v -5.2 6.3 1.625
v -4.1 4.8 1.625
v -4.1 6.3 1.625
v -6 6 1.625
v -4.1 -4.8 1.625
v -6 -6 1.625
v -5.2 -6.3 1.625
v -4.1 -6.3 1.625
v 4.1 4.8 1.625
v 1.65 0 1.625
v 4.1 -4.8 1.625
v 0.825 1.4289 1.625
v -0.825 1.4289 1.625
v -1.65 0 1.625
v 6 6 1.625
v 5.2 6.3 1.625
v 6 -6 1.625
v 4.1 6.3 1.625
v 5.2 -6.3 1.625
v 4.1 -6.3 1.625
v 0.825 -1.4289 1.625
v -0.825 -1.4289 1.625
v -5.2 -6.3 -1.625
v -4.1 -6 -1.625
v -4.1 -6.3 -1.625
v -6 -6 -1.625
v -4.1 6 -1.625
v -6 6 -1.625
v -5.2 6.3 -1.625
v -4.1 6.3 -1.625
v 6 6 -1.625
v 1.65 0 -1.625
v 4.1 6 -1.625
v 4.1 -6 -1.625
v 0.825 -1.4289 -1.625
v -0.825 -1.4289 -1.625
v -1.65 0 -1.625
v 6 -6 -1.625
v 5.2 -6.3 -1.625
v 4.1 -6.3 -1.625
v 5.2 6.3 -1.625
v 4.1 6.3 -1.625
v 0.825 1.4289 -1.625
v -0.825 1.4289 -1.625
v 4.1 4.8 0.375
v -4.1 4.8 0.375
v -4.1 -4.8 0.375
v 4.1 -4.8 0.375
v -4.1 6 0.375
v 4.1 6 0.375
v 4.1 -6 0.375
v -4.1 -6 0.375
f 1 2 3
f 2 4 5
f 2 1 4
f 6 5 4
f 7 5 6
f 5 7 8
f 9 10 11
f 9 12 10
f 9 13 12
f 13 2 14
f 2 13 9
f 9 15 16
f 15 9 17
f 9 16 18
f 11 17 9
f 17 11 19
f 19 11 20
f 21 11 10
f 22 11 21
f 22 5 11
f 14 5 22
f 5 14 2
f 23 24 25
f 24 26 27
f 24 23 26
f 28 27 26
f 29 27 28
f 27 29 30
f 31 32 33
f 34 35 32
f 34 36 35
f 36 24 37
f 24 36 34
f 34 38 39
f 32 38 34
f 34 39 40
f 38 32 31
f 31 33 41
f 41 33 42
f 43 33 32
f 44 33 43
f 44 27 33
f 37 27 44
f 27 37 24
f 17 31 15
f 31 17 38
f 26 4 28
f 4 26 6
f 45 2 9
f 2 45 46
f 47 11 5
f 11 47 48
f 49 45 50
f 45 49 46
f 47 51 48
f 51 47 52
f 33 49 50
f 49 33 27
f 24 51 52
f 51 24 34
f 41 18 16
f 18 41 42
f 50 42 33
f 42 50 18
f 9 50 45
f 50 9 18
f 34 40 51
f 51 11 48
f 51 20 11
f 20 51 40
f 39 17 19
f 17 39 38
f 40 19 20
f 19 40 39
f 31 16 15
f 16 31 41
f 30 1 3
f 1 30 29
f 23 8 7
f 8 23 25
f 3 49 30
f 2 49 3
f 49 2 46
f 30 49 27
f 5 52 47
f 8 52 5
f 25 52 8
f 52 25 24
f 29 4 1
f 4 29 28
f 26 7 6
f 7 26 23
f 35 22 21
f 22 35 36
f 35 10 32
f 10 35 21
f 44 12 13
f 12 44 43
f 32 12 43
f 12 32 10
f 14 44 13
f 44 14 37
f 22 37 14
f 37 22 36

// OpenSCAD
// Parameters
screw_diameter_mm = 4.0; //[2.0:8.0:0.1]
thread_pitch_mm = 0.7; //[0.35:1.4:0.05]
across_flats_mm = 6.0; //[3.0:12.0:0.1]
thickness_mm = 3.25; //[1.6:6.5:0.05]
pilot_hole_diameter_mm = 3.3; //[2.5:4.2:0.05]
clearance_mm = 0.15; //[0.05:0.4:0.01]
corner_chamfer_mm = 0.3; //[0.1:1.0:0.05]
edge_fillet_radius_mm = 0.2; //[0.0:1.0:0.05]
t_slot_opening_width_mm = 6.2; //[4.0:12.0:0.1]
t_slot_internal_width_mm = 10.0; //[6.0:20.0:0.1]
t_slot_depth_mm = 6.0; //[3.0:12.0:0.1]
nut_overall_length_mm = 12.0; //[6.0:24.0:0.1]
nut_overall_width_mm = 9.6; //[5.0:18.0:0.1]
lip_height_mm = 1.0; //[0.5:2.5:0.05]
lip_width_mm = 1.2; //[0.6:3.0:0.05]
overlap_mm = 0.8; //[0.5:2.0:0.1]
anti_rotation_bump_depth_mm = 0.4; //[0.2:1.2:0.05]
anti_rotation_bump_length_mm = 4.0; //[2.0:10.0:0.1]

// Nut and Washer - complete geometry
module nut_and_washer() {
  color("DimGray") {
    // Hex profile
    cylinder(r=across_flats_mm/(2*cos(30)), h=thickness_mm, center=true);
    
    // T-slot nut body
    translate([0, 0, 0])
      cube([nut_overall_length_mm, nut_overall_width_mm, thickness_mm], center=true);
    
    // T-slot engagement lips
    translate([0, 0, -thickness_mm/2 + lip_height_mm])
      cube([nut_overall_length_mm, nut_overall_width_mm + 2*lip_width_mm, 2*lip_height_mm], center=true);
    
    // Anti-rotation features
    translate([0, -(nut_overall_width_mm/2 + anti_rotation_bump_depth_mm/2 - overlap_mm), 0])
      cube([anti_rotation_bump_length_mm, anti_rotation_bump_depth_mm, thickness_mm], center=true);
    translate([0, (nut_overall_width_mm/2 + anti_rotation_bump_depth_mm/2 - overlap_mm), 0])
      cube([anti_rotation_bump_length_mm, anti_rotation_bump_depth_mm, thickness_mm], center=true);
    
    // Lead-in chamfers
    hull() {
      translate([nut_overall_length_mm/2 - corner_chamfer_mm/2, 0, 0])
        cube([corner_chamfer_mm, nut_overall_width_mm + 2*lip_width_mm, thickness_mm], center=true);
      translate([nut_overall_length_mm/2 - (corner_chamfer_mm + overlap_mm)/2 - overlap_mm, 0, 0])
        cube([corner_chamfer_mm + overlap_mm, nut_overall_width_mm + 2*lip_width_mm + 2*corner_chamfer_mm, thickness_mm], center=true);
    }
    hull() {
      translate([-(nut_overall_length_mm/2 - corner_chamfer_mm/2), 0, 0])
        cube([corner_chamfer_mm, nut_overall_width_mm + 2*lip_width_mm, thickness_mm], center=true);
      translate([-(nut_overall_length_mm/2 - (corner_chamfer_mm + overlap_mm)/2 - overlap_mm), 0, 0])
        cube([corner_chamfer_mm + overlap_mm, nut_overall_width_mm + 2*lip_width_mm + 2*corner_chamfer_mm, thickness_mm], center=true);
    }
  }
}

// Assembly
module assembly() {
  difference() {
    nut_and_washer();
    // Central threaded hole
    translate([0, 0, 0])
      cylinder(r=pilot_hole_diameter_mm/2, h=thickness_mm + 2*overlap_mm, center=true);
  }
}

assembly();
